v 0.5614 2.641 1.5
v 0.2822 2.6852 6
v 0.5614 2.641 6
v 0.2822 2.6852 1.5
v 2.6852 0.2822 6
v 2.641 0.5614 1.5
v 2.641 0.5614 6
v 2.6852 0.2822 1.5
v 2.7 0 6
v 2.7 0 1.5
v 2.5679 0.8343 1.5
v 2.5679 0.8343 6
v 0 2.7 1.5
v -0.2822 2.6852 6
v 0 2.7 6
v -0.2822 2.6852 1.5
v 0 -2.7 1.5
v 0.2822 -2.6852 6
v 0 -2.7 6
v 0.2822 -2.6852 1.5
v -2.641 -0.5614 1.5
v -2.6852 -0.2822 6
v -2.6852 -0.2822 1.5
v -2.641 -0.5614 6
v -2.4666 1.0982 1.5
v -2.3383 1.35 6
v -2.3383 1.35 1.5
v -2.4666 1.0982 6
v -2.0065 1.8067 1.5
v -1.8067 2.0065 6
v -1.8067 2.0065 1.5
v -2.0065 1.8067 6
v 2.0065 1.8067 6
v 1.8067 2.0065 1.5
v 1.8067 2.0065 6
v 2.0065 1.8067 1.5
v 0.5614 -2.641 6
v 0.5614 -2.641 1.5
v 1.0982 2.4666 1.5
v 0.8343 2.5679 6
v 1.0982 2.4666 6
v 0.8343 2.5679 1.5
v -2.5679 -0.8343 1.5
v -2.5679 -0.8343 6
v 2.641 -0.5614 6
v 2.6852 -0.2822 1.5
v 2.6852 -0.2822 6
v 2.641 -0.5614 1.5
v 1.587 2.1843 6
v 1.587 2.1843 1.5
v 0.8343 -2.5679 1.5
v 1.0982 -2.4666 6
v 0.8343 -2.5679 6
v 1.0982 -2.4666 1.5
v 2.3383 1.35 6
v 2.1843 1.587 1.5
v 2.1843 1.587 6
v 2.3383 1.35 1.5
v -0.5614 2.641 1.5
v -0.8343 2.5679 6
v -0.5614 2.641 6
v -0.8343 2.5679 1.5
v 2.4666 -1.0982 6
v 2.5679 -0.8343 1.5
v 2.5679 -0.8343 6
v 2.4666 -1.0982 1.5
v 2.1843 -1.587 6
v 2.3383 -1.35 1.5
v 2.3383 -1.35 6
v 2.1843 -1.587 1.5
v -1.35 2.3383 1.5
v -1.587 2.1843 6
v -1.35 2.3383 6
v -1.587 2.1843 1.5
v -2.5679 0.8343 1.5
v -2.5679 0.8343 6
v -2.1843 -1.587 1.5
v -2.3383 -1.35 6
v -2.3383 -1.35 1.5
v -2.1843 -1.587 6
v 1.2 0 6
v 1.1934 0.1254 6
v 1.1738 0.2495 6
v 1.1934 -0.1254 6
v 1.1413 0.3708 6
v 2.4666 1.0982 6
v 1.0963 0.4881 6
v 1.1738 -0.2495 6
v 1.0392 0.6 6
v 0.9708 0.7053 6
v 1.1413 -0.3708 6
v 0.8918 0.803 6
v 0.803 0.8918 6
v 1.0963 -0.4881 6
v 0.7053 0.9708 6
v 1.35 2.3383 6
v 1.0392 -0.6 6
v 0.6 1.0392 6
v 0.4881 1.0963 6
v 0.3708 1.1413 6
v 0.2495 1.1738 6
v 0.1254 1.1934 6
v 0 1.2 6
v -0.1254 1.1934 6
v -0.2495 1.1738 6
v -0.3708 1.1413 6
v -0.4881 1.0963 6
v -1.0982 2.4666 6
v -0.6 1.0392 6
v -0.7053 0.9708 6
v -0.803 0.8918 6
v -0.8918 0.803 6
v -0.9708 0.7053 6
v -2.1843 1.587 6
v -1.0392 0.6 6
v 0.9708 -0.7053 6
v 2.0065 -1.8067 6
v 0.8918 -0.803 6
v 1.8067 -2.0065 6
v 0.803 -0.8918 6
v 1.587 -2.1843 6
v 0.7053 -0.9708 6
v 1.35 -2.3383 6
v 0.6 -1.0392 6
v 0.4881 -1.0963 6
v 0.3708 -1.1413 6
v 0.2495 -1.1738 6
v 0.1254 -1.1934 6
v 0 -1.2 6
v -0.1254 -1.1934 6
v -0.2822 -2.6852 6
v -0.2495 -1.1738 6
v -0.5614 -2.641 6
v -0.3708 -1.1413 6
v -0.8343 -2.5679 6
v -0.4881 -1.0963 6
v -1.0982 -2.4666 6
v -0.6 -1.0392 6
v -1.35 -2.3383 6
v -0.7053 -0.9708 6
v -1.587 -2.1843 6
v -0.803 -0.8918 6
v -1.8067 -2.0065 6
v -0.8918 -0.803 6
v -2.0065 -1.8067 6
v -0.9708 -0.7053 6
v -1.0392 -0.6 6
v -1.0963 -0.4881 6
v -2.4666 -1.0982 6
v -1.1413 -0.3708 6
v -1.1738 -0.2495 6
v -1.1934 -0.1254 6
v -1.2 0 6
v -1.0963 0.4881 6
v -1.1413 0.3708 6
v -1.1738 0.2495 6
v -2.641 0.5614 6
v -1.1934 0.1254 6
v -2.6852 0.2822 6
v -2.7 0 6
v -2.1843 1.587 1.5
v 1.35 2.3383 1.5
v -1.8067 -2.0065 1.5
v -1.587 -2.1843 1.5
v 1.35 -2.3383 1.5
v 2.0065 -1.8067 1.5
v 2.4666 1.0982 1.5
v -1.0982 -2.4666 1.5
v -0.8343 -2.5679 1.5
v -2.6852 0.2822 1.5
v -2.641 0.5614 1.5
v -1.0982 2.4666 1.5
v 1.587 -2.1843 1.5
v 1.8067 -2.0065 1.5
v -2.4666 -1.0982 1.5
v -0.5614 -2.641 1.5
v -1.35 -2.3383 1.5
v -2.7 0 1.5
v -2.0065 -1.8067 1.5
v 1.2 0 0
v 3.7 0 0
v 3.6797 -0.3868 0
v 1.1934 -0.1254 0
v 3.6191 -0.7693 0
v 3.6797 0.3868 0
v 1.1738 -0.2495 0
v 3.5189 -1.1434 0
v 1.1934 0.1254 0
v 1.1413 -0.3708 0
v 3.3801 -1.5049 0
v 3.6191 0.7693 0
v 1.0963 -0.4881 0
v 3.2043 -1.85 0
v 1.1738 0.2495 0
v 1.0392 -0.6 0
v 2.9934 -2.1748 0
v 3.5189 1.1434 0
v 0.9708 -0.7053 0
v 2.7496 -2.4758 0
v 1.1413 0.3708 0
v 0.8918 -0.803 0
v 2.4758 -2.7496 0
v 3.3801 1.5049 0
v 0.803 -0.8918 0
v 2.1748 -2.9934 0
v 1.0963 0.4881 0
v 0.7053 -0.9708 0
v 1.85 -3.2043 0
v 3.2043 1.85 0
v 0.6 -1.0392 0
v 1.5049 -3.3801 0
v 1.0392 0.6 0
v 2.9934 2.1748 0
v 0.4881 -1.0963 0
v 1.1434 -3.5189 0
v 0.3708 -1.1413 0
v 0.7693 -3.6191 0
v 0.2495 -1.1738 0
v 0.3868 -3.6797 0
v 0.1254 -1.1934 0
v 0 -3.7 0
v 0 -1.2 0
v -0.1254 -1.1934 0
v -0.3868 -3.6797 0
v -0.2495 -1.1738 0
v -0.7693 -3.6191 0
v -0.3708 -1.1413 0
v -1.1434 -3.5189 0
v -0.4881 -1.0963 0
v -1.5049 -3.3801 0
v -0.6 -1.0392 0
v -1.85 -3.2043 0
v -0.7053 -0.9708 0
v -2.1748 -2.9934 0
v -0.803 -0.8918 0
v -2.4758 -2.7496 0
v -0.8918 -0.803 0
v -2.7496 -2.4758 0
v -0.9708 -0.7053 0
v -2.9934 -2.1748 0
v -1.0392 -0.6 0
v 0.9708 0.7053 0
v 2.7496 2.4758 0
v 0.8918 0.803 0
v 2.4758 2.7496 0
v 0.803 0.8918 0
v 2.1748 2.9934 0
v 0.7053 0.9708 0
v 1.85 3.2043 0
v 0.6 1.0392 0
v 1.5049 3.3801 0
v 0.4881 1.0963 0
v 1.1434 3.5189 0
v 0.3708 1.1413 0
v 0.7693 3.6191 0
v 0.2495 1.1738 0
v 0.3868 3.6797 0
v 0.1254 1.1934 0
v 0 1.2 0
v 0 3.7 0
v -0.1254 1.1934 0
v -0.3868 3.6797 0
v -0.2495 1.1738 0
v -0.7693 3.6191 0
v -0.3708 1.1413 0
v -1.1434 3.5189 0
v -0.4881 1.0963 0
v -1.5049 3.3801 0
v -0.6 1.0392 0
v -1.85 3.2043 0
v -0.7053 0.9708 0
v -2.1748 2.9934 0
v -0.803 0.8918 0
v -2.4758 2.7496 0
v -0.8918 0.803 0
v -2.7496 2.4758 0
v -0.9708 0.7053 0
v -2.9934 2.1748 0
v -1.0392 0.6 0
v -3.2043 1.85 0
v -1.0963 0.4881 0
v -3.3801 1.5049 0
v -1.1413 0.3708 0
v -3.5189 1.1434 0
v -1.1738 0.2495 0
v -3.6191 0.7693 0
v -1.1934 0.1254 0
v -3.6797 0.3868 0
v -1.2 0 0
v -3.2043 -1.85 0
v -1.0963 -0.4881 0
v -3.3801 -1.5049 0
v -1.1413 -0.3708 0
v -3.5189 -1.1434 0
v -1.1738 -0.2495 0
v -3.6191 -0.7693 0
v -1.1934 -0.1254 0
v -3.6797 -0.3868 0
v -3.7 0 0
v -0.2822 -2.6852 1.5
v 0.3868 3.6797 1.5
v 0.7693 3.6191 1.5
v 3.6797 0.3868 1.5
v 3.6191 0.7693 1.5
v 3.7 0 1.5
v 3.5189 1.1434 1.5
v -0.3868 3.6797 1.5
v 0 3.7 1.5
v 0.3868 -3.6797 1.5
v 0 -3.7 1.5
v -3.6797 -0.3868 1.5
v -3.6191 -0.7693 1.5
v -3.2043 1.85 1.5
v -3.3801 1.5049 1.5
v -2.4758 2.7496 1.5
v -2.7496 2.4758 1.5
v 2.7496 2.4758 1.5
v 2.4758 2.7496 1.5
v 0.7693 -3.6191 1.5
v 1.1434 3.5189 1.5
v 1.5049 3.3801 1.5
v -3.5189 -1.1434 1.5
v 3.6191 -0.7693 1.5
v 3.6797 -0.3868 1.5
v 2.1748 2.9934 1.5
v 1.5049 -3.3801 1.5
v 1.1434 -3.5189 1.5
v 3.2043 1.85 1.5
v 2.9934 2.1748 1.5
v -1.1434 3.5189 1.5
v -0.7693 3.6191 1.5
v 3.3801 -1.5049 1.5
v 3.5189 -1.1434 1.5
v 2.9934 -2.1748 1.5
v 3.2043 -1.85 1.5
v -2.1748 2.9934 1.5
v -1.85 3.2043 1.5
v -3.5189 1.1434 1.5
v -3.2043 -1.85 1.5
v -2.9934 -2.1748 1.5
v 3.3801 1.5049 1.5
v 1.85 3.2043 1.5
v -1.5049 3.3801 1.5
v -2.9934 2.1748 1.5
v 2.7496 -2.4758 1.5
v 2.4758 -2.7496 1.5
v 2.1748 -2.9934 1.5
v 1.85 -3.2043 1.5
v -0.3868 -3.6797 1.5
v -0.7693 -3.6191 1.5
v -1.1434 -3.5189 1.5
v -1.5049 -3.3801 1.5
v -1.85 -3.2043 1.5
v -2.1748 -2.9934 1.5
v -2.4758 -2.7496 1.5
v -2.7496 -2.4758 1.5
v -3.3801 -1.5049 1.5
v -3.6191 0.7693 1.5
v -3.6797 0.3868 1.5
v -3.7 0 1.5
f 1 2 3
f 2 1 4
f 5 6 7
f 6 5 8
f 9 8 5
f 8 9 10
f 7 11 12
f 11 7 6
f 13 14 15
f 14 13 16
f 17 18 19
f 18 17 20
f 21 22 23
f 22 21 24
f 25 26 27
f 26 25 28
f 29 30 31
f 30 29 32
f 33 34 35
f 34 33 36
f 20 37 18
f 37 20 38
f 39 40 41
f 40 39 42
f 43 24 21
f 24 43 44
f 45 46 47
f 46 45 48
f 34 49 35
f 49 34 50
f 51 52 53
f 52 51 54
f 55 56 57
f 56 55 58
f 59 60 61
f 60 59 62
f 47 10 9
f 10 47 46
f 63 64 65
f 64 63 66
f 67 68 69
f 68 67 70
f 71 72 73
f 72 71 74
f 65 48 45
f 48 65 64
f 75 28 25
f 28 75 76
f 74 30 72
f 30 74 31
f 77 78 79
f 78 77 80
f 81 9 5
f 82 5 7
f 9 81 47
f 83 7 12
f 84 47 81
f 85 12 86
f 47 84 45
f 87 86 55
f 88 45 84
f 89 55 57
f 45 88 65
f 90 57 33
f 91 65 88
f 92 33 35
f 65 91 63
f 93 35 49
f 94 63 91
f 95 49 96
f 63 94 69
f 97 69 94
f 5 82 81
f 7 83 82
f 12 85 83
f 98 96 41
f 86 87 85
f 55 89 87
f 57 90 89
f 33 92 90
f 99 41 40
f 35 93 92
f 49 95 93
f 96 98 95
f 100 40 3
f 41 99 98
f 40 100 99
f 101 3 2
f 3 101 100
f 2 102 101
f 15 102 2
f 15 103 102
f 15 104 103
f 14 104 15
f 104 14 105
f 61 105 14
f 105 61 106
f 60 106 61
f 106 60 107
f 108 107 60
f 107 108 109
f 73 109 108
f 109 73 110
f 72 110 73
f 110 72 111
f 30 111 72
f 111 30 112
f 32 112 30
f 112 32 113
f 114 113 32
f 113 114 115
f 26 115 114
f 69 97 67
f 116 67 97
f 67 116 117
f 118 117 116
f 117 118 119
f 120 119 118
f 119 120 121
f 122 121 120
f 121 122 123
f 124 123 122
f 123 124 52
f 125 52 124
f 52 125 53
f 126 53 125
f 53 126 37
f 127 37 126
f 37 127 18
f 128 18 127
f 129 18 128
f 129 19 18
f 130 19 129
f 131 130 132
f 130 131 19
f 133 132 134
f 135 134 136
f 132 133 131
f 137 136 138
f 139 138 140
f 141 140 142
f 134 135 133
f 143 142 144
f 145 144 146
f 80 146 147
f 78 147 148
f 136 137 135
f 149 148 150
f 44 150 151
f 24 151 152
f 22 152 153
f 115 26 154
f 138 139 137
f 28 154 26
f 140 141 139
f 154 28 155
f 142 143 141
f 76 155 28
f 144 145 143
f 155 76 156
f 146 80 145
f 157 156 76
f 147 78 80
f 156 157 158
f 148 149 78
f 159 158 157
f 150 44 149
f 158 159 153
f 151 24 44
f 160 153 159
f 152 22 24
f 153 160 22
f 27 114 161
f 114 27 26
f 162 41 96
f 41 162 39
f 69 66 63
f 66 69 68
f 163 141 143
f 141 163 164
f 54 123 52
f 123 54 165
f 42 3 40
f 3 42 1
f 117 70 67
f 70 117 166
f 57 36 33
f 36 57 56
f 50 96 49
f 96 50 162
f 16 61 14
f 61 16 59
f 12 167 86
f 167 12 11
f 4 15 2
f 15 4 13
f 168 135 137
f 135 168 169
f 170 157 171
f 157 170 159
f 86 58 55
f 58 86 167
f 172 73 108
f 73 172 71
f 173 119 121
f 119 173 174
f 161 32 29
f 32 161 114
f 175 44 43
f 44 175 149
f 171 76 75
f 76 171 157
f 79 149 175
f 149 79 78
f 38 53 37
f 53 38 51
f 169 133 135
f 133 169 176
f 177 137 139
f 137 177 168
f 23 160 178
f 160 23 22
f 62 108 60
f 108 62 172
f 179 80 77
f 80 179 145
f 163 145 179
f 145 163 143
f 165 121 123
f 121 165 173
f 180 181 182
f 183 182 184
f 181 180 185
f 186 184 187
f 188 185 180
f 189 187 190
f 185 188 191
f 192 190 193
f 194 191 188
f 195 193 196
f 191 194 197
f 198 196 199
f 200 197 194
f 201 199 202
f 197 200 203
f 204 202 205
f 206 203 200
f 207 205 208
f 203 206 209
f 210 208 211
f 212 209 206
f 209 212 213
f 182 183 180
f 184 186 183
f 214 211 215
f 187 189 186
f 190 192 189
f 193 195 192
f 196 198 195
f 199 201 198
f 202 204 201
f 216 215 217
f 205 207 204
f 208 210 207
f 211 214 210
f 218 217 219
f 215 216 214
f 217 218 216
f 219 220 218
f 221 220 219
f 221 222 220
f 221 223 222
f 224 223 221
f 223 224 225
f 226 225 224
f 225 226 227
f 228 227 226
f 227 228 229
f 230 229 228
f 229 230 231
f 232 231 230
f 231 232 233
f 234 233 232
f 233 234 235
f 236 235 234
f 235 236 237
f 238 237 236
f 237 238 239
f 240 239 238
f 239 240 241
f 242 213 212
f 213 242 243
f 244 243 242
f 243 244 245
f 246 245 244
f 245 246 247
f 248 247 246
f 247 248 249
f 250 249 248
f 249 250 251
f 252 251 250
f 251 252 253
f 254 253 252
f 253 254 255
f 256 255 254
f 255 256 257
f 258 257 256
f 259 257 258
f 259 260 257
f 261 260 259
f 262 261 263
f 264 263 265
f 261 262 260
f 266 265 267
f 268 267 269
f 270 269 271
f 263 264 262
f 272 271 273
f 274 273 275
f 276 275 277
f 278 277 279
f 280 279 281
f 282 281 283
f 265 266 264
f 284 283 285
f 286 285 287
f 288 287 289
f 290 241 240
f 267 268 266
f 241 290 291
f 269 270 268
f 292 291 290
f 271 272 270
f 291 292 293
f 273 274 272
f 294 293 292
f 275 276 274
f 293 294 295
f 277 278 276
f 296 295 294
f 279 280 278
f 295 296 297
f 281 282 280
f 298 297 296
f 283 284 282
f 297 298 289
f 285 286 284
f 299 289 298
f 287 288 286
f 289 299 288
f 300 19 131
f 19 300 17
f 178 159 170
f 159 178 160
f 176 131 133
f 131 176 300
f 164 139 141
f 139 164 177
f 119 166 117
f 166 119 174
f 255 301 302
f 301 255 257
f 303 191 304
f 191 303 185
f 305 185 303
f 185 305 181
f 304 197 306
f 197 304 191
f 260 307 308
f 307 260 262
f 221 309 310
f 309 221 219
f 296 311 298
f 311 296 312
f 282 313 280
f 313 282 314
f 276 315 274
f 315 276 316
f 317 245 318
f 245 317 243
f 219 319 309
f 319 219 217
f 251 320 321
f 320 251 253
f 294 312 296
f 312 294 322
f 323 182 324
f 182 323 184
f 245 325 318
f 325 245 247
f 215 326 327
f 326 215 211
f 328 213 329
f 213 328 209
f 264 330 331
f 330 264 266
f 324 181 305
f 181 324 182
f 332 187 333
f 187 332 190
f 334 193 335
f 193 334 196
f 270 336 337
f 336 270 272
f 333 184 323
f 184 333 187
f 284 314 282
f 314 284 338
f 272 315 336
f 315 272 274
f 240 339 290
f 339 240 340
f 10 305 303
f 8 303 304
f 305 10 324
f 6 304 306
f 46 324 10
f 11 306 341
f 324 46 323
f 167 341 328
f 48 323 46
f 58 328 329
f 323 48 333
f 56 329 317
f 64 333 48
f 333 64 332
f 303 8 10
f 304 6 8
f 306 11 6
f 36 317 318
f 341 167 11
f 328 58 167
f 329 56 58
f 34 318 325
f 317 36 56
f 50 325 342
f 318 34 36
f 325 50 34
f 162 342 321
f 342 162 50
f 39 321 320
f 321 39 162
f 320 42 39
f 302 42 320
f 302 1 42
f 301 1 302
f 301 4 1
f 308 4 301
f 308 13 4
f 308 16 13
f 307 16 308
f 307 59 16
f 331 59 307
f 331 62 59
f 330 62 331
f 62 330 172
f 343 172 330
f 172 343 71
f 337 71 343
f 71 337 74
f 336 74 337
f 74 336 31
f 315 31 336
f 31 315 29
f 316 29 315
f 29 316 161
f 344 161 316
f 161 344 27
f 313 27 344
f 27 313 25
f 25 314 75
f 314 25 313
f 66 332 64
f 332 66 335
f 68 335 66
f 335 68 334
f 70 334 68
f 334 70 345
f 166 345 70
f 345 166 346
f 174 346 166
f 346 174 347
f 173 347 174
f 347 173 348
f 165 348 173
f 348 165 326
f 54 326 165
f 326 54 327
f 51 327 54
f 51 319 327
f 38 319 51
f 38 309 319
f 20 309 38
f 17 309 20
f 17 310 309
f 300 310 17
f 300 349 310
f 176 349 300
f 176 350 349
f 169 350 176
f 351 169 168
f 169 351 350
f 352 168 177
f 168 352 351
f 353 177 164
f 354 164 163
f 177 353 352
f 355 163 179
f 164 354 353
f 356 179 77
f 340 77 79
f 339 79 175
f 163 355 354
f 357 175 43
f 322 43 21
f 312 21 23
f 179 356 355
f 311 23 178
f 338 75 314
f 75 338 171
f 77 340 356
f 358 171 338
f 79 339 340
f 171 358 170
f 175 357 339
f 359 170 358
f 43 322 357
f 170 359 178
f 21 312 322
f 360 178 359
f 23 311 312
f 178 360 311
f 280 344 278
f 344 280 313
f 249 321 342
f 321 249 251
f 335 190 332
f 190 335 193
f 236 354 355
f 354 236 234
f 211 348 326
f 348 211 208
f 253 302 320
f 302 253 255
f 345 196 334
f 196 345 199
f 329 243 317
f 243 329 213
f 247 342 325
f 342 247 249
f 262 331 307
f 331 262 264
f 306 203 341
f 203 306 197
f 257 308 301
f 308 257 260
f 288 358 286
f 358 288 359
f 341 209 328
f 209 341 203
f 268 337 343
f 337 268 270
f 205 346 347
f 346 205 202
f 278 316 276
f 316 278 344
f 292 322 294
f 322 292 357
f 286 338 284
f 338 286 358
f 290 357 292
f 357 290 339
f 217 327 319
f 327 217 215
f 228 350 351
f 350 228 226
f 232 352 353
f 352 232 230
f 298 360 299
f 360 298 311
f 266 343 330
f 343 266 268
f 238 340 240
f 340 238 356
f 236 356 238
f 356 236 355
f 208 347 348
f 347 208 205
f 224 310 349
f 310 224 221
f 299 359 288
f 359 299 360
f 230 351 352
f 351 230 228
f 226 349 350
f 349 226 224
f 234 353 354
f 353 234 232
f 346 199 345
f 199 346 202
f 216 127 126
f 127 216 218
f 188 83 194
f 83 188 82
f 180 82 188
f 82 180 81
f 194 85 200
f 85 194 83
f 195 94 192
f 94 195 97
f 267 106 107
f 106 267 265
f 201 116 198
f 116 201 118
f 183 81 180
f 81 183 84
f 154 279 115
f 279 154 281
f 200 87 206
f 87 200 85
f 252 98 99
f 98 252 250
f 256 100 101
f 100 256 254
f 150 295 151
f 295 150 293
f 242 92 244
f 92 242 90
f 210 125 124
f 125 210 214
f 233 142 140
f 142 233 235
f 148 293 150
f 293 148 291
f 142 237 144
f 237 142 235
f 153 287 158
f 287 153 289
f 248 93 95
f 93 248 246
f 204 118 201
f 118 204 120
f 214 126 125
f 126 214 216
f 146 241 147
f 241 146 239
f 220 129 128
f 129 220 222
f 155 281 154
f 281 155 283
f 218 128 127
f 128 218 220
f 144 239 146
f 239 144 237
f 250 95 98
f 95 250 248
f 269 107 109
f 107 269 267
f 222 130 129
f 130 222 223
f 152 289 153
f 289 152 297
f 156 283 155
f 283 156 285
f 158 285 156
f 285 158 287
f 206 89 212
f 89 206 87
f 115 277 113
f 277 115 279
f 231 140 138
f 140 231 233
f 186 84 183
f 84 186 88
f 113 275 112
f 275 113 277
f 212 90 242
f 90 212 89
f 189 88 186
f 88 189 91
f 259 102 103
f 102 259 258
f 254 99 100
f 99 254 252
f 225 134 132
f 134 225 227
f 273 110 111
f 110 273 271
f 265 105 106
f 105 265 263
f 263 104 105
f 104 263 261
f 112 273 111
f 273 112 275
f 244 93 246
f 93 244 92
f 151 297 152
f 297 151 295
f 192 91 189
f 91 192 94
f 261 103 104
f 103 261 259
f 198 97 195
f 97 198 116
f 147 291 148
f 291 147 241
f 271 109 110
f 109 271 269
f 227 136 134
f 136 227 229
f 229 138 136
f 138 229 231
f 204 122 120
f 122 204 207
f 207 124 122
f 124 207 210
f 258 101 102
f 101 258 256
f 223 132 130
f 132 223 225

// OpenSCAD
// Blind-rivet body.
$fn = 60;
eps = 0.02;
shank_d = 2.4;
head_d = 5;
length = 6;
difference() { union() { cylinder(d=shank_d+3,h=length); cylinder(d=max(head_d, shank_d+5),h=1.5); } translate([0,0,-eps]) cylinder(d=shank_d,h=length+2*eps); }
